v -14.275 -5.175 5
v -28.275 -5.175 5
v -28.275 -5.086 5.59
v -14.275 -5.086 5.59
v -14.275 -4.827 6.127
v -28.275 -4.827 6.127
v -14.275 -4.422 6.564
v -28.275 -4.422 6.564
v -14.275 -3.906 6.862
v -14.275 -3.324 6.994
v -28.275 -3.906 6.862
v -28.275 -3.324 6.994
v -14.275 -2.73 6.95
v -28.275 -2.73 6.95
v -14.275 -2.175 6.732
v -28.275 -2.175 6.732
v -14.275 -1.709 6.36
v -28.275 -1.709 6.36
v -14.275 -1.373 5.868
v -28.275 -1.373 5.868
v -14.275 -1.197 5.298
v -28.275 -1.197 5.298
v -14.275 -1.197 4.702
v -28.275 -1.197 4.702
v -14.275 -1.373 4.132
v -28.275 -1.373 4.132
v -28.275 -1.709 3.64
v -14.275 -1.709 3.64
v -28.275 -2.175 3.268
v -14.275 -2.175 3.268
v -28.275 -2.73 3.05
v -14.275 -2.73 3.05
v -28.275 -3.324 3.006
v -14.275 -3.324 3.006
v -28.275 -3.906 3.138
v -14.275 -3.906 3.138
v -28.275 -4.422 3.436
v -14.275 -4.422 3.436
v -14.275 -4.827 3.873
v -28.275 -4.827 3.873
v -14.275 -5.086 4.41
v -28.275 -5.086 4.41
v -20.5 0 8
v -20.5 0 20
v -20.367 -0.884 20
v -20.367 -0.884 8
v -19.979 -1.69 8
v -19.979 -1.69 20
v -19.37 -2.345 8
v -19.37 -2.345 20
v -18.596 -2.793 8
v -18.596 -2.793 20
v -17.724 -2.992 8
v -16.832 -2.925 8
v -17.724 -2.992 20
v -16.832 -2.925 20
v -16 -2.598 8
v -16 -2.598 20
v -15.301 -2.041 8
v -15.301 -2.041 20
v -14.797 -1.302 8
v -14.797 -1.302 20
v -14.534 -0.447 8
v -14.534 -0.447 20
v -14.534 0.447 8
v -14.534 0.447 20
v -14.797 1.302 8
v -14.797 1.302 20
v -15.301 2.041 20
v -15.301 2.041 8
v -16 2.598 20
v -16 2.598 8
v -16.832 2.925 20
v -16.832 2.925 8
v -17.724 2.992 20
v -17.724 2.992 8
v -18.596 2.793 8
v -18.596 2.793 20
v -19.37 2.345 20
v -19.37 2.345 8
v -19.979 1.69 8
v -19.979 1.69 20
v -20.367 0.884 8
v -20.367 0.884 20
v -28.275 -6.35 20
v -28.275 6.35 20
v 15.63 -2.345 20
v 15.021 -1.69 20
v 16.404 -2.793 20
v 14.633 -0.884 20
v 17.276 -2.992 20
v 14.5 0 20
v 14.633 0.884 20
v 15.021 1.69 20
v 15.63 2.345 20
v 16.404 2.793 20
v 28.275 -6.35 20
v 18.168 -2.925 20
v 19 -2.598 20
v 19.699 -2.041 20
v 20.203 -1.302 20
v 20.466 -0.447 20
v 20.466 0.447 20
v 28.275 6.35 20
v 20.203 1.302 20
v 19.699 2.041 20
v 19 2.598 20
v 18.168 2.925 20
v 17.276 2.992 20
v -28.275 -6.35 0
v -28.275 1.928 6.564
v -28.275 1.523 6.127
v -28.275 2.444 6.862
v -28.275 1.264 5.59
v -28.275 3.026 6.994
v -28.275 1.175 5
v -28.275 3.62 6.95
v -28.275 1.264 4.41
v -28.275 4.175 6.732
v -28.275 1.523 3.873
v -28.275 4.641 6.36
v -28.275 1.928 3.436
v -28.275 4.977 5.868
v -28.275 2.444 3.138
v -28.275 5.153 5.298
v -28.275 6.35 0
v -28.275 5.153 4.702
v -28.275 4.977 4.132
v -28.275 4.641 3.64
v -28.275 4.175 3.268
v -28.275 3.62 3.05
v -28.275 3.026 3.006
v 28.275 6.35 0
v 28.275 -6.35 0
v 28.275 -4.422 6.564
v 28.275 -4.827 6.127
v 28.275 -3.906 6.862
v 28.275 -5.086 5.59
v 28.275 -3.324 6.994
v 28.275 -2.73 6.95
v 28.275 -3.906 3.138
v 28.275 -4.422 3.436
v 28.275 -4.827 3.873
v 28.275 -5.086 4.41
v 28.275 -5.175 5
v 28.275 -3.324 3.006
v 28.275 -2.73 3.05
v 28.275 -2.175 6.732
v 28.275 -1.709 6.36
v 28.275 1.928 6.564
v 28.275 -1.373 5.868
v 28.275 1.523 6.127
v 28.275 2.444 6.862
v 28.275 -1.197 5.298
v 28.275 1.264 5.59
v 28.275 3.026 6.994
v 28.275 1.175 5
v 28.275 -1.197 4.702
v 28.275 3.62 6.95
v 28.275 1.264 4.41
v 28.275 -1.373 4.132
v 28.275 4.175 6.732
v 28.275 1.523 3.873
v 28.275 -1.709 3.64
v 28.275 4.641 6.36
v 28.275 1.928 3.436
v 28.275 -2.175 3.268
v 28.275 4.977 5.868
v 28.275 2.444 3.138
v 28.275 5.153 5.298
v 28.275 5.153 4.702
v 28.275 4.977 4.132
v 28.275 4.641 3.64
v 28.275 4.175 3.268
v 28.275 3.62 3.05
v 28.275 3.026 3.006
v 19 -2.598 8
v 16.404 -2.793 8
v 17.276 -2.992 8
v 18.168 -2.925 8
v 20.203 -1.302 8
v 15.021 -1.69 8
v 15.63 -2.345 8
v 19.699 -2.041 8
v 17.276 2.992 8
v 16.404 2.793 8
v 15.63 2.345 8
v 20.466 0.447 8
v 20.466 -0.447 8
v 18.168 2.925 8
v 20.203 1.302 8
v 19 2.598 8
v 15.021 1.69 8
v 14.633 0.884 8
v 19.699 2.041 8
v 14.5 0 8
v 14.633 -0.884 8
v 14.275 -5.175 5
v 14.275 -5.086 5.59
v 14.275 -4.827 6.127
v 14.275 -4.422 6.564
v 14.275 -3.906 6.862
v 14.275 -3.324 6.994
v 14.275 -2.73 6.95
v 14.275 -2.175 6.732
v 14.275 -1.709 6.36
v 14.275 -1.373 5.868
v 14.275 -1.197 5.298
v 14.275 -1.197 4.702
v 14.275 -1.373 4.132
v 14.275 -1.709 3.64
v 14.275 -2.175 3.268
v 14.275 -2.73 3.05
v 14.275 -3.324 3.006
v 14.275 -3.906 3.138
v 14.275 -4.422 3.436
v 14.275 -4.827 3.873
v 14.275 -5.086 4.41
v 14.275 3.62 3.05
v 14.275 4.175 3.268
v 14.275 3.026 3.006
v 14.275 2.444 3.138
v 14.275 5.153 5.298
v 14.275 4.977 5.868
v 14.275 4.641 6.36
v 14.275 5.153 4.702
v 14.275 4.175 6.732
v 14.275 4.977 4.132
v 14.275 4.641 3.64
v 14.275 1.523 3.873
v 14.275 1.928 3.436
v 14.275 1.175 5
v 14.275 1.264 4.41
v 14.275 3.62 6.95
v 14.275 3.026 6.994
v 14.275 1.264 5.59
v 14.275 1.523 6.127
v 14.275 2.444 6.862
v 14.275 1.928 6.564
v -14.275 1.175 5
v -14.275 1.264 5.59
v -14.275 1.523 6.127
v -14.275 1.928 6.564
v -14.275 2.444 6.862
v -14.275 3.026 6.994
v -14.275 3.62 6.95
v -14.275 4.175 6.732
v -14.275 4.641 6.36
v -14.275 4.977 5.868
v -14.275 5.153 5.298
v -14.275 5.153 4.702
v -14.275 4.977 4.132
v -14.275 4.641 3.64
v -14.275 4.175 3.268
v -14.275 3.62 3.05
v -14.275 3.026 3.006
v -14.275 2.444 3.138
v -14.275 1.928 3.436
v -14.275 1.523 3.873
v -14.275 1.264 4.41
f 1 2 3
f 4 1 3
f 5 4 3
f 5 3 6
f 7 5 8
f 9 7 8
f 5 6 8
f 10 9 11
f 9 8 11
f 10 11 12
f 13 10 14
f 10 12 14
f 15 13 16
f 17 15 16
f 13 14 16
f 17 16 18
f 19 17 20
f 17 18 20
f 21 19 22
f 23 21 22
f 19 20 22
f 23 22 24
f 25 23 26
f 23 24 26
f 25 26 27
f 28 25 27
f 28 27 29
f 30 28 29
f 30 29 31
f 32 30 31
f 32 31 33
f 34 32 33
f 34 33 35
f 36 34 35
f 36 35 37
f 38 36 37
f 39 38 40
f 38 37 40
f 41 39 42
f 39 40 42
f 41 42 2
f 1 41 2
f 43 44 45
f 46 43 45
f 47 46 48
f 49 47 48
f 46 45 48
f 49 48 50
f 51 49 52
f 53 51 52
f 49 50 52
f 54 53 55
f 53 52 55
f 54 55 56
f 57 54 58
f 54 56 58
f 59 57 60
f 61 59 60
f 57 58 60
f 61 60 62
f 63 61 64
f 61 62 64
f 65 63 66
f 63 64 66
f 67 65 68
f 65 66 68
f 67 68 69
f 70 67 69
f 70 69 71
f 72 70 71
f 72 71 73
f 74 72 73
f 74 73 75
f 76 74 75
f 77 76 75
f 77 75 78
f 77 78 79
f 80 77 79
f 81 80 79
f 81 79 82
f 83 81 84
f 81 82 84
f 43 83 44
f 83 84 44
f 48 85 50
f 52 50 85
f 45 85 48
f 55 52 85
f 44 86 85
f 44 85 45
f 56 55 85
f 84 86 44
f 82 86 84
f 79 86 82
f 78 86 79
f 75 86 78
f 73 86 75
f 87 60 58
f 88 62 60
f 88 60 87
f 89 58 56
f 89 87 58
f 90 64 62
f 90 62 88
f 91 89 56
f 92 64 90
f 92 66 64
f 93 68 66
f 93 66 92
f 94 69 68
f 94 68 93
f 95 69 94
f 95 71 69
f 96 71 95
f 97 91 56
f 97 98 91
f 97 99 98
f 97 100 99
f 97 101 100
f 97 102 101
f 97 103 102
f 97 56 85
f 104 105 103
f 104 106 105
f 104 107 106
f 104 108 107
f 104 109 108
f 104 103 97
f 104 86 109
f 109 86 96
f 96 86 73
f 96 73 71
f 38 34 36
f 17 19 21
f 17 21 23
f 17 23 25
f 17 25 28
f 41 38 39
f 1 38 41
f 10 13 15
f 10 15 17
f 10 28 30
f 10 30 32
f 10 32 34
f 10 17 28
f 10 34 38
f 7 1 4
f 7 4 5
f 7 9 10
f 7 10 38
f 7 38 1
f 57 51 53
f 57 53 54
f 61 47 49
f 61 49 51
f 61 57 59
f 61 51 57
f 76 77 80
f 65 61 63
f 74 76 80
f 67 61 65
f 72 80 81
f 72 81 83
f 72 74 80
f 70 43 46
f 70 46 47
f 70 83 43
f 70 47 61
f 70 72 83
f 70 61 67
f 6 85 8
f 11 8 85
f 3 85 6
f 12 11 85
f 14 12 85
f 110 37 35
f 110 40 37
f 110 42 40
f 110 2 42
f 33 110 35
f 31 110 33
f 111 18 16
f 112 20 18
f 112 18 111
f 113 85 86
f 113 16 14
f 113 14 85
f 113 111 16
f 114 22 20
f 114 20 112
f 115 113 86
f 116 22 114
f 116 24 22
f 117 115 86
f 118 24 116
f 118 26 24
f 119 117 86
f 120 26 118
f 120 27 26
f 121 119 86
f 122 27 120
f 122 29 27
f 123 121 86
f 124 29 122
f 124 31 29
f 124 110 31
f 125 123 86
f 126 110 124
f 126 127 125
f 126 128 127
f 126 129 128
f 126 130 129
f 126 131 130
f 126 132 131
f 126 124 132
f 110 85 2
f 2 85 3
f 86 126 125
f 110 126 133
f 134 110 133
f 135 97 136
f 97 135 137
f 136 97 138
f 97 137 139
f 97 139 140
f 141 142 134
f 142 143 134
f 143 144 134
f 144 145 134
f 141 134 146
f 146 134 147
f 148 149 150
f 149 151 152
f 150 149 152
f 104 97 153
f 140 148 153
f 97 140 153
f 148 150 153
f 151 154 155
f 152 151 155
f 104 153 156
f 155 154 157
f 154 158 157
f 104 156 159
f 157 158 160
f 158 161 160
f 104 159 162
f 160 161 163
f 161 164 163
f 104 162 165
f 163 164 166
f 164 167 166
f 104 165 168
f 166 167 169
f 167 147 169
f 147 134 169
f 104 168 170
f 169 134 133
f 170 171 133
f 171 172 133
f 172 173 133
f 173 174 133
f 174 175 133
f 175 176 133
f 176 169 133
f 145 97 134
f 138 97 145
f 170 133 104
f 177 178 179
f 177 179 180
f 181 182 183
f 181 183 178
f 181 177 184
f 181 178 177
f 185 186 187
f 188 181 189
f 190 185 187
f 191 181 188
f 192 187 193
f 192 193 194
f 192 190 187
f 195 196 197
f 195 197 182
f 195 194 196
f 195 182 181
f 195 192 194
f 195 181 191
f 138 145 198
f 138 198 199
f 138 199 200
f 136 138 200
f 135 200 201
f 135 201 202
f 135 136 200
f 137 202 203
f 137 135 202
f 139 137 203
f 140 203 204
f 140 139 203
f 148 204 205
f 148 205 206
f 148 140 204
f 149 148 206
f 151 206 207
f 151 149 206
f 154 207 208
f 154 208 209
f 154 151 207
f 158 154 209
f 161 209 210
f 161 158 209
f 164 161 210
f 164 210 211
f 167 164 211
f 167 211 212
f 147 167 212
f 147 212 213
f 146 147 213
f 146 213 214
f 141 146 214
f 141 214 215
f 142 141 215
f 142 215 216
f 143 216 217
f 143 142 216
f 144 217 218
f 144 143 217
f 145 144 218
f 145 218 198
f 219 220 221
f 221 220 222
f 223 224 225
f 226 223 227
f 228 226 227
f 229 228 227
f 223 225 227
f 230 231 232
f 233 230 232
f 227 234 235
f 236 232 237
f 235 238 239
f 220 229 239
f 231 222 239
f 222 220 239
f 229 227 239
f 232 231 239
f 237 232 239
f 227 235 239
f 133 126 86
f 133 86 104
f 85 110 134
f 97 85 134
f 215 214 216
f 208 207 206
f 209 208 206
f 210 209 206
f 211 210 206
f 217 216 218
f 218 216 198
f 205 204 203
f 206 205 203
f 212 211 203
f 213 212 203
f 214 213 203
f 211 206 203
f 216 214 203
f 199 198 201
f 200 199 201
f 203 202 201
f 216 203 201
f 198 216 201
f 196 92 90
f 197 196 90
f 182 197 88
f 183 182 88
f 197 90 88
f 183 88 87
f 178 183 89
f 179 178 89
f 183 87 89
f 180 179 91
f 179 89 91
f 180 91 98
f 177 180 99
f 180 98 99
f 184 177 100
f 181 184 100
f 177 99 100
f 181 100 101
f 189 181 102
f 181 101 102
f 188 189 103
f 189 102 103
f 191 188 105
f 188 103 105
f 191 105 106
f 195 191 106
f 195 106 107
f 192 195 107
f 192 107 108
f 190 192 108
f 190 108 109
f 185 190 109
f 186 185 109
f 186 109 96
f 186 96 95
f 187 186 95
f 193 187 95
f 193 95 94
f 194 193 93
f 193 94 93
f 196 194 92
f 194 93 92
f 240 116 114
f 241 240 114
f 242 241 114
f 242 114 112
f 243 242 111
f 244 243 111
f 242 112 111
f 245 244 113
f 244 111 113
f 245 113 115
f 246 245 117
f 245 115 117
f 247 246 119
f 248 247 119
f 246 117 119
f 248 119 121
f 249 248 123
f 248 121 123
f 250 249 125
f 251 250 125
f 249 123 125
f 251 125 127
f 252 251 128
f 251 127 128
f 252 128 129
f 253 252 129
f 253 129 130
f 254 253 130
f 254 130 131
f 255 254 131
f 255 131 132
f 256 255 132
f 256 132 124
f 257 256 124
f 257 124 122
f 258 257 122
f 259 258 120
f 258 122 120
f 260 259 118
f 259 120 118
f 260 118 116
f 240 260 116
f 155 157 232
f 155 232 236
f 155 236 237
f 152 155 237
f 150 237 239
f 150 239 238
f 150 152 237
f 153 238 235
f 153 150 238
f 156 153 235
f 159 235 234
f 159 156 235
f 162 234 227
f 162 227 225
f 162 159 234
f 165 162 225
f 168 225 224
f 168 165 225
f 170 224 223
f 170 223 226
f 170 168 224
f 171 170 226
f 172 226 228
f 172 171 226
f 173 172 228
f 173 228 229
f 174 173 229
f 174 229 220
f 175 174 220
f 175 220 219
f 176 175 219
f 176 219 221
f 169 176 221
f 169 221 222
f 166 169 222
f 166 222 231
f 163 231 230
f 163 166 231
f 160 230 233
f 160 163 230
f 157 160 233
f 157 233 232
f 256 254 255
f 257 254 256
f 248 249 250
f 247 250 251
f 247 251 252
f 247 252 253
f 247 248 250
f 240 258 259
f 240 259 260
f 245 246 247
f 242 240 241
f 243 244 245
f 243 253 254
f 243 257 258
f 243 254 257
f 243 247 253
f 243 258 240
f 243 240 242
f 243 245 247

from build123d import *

# Parameters (mm, degrees)
SKETCH1_W           = 56.55
SKETCH1_H           = 12.7
BOSS_EXTRUDE1_DEPTH = 20
CUT_EXTRUDE1_DEPTH  = 12
SKETCH3_R           = 2
CUT_EXTRUDE2_DEPTH  = 14


with BuildPart() as part:
    # Sketch1 → Boss-Extrude1 (new body)
    with BuildSketch(Plane.XY):
        Rectangle(SKETCH1_W, SKETCH1_H)
    extrude(amount=BOSS_EXTRUDE1_DEPTH)

    # Sketch2 → Cut-Extrude1 (cut)
    with BuildSketch(Plane.XY.offset(20)):
        with BuildLine():
            Line((-20.5, 0), (-17.5, 0))
            Line((-17.5, 0), (-14.5, 0))
            ThreePointArc((-14.5, 0), (-17.5, 3), (-20.5, 0))
        make_face()
        with BuildLine():
            Line((-14.5, 0), (-17.5, 0))
            Line((-17.5, 0), (-20.5, 0))
            ThreePointArc((-20.5, 0), (-17.5, -3), (-14.5, 0))
        make_face()
        with BuildLine():
            ThreePointArc((20.5, 0), (17.5, 3), (14.5, 0))
            Line((14.5, 0), (17.5, 0))
            Line((17.5, 0), (20.5, 0))
        make_face()
        with BuildLine():
            Line((17.5, 0), (14.5, 0))
            ThreePointArc((14.5, 0), (17.5, -3), (20.5, 0))
            Line((20.5, 0), (17.5, 0))
        make_face()
    extrude(amount=-CUT_EXTRUDE1_DEPTH, mode=Mode.SUBTRACT)

    # Sketch3 → Cut-Extrude2 (cut)
    with BuildSketch(Plane.ZY.offset(28.275)):
        with Locations(Location((5, 3.175, 0), (0, 0, 270))):
            Circle(SKETCH3_R)
        with Locations(Location((5, -3.175, 0), (0, 0, 270))):
            Circle(SKETCH3_R)
    cut_extrude2 = extrude(amount=-CUT_EXTRUDE2_DEPTH, mode=Mode.SUBTRACT)

    # Mirror1: Cut-Extrude2 across plane
    add(cut_extrude2.mirror(Plane(origin=(0, 0, 0), x_dir=(0, 0, 1), z_dir=(1, 0, 0))), mode=Mode.SUBTRACT)


solid = part.part
